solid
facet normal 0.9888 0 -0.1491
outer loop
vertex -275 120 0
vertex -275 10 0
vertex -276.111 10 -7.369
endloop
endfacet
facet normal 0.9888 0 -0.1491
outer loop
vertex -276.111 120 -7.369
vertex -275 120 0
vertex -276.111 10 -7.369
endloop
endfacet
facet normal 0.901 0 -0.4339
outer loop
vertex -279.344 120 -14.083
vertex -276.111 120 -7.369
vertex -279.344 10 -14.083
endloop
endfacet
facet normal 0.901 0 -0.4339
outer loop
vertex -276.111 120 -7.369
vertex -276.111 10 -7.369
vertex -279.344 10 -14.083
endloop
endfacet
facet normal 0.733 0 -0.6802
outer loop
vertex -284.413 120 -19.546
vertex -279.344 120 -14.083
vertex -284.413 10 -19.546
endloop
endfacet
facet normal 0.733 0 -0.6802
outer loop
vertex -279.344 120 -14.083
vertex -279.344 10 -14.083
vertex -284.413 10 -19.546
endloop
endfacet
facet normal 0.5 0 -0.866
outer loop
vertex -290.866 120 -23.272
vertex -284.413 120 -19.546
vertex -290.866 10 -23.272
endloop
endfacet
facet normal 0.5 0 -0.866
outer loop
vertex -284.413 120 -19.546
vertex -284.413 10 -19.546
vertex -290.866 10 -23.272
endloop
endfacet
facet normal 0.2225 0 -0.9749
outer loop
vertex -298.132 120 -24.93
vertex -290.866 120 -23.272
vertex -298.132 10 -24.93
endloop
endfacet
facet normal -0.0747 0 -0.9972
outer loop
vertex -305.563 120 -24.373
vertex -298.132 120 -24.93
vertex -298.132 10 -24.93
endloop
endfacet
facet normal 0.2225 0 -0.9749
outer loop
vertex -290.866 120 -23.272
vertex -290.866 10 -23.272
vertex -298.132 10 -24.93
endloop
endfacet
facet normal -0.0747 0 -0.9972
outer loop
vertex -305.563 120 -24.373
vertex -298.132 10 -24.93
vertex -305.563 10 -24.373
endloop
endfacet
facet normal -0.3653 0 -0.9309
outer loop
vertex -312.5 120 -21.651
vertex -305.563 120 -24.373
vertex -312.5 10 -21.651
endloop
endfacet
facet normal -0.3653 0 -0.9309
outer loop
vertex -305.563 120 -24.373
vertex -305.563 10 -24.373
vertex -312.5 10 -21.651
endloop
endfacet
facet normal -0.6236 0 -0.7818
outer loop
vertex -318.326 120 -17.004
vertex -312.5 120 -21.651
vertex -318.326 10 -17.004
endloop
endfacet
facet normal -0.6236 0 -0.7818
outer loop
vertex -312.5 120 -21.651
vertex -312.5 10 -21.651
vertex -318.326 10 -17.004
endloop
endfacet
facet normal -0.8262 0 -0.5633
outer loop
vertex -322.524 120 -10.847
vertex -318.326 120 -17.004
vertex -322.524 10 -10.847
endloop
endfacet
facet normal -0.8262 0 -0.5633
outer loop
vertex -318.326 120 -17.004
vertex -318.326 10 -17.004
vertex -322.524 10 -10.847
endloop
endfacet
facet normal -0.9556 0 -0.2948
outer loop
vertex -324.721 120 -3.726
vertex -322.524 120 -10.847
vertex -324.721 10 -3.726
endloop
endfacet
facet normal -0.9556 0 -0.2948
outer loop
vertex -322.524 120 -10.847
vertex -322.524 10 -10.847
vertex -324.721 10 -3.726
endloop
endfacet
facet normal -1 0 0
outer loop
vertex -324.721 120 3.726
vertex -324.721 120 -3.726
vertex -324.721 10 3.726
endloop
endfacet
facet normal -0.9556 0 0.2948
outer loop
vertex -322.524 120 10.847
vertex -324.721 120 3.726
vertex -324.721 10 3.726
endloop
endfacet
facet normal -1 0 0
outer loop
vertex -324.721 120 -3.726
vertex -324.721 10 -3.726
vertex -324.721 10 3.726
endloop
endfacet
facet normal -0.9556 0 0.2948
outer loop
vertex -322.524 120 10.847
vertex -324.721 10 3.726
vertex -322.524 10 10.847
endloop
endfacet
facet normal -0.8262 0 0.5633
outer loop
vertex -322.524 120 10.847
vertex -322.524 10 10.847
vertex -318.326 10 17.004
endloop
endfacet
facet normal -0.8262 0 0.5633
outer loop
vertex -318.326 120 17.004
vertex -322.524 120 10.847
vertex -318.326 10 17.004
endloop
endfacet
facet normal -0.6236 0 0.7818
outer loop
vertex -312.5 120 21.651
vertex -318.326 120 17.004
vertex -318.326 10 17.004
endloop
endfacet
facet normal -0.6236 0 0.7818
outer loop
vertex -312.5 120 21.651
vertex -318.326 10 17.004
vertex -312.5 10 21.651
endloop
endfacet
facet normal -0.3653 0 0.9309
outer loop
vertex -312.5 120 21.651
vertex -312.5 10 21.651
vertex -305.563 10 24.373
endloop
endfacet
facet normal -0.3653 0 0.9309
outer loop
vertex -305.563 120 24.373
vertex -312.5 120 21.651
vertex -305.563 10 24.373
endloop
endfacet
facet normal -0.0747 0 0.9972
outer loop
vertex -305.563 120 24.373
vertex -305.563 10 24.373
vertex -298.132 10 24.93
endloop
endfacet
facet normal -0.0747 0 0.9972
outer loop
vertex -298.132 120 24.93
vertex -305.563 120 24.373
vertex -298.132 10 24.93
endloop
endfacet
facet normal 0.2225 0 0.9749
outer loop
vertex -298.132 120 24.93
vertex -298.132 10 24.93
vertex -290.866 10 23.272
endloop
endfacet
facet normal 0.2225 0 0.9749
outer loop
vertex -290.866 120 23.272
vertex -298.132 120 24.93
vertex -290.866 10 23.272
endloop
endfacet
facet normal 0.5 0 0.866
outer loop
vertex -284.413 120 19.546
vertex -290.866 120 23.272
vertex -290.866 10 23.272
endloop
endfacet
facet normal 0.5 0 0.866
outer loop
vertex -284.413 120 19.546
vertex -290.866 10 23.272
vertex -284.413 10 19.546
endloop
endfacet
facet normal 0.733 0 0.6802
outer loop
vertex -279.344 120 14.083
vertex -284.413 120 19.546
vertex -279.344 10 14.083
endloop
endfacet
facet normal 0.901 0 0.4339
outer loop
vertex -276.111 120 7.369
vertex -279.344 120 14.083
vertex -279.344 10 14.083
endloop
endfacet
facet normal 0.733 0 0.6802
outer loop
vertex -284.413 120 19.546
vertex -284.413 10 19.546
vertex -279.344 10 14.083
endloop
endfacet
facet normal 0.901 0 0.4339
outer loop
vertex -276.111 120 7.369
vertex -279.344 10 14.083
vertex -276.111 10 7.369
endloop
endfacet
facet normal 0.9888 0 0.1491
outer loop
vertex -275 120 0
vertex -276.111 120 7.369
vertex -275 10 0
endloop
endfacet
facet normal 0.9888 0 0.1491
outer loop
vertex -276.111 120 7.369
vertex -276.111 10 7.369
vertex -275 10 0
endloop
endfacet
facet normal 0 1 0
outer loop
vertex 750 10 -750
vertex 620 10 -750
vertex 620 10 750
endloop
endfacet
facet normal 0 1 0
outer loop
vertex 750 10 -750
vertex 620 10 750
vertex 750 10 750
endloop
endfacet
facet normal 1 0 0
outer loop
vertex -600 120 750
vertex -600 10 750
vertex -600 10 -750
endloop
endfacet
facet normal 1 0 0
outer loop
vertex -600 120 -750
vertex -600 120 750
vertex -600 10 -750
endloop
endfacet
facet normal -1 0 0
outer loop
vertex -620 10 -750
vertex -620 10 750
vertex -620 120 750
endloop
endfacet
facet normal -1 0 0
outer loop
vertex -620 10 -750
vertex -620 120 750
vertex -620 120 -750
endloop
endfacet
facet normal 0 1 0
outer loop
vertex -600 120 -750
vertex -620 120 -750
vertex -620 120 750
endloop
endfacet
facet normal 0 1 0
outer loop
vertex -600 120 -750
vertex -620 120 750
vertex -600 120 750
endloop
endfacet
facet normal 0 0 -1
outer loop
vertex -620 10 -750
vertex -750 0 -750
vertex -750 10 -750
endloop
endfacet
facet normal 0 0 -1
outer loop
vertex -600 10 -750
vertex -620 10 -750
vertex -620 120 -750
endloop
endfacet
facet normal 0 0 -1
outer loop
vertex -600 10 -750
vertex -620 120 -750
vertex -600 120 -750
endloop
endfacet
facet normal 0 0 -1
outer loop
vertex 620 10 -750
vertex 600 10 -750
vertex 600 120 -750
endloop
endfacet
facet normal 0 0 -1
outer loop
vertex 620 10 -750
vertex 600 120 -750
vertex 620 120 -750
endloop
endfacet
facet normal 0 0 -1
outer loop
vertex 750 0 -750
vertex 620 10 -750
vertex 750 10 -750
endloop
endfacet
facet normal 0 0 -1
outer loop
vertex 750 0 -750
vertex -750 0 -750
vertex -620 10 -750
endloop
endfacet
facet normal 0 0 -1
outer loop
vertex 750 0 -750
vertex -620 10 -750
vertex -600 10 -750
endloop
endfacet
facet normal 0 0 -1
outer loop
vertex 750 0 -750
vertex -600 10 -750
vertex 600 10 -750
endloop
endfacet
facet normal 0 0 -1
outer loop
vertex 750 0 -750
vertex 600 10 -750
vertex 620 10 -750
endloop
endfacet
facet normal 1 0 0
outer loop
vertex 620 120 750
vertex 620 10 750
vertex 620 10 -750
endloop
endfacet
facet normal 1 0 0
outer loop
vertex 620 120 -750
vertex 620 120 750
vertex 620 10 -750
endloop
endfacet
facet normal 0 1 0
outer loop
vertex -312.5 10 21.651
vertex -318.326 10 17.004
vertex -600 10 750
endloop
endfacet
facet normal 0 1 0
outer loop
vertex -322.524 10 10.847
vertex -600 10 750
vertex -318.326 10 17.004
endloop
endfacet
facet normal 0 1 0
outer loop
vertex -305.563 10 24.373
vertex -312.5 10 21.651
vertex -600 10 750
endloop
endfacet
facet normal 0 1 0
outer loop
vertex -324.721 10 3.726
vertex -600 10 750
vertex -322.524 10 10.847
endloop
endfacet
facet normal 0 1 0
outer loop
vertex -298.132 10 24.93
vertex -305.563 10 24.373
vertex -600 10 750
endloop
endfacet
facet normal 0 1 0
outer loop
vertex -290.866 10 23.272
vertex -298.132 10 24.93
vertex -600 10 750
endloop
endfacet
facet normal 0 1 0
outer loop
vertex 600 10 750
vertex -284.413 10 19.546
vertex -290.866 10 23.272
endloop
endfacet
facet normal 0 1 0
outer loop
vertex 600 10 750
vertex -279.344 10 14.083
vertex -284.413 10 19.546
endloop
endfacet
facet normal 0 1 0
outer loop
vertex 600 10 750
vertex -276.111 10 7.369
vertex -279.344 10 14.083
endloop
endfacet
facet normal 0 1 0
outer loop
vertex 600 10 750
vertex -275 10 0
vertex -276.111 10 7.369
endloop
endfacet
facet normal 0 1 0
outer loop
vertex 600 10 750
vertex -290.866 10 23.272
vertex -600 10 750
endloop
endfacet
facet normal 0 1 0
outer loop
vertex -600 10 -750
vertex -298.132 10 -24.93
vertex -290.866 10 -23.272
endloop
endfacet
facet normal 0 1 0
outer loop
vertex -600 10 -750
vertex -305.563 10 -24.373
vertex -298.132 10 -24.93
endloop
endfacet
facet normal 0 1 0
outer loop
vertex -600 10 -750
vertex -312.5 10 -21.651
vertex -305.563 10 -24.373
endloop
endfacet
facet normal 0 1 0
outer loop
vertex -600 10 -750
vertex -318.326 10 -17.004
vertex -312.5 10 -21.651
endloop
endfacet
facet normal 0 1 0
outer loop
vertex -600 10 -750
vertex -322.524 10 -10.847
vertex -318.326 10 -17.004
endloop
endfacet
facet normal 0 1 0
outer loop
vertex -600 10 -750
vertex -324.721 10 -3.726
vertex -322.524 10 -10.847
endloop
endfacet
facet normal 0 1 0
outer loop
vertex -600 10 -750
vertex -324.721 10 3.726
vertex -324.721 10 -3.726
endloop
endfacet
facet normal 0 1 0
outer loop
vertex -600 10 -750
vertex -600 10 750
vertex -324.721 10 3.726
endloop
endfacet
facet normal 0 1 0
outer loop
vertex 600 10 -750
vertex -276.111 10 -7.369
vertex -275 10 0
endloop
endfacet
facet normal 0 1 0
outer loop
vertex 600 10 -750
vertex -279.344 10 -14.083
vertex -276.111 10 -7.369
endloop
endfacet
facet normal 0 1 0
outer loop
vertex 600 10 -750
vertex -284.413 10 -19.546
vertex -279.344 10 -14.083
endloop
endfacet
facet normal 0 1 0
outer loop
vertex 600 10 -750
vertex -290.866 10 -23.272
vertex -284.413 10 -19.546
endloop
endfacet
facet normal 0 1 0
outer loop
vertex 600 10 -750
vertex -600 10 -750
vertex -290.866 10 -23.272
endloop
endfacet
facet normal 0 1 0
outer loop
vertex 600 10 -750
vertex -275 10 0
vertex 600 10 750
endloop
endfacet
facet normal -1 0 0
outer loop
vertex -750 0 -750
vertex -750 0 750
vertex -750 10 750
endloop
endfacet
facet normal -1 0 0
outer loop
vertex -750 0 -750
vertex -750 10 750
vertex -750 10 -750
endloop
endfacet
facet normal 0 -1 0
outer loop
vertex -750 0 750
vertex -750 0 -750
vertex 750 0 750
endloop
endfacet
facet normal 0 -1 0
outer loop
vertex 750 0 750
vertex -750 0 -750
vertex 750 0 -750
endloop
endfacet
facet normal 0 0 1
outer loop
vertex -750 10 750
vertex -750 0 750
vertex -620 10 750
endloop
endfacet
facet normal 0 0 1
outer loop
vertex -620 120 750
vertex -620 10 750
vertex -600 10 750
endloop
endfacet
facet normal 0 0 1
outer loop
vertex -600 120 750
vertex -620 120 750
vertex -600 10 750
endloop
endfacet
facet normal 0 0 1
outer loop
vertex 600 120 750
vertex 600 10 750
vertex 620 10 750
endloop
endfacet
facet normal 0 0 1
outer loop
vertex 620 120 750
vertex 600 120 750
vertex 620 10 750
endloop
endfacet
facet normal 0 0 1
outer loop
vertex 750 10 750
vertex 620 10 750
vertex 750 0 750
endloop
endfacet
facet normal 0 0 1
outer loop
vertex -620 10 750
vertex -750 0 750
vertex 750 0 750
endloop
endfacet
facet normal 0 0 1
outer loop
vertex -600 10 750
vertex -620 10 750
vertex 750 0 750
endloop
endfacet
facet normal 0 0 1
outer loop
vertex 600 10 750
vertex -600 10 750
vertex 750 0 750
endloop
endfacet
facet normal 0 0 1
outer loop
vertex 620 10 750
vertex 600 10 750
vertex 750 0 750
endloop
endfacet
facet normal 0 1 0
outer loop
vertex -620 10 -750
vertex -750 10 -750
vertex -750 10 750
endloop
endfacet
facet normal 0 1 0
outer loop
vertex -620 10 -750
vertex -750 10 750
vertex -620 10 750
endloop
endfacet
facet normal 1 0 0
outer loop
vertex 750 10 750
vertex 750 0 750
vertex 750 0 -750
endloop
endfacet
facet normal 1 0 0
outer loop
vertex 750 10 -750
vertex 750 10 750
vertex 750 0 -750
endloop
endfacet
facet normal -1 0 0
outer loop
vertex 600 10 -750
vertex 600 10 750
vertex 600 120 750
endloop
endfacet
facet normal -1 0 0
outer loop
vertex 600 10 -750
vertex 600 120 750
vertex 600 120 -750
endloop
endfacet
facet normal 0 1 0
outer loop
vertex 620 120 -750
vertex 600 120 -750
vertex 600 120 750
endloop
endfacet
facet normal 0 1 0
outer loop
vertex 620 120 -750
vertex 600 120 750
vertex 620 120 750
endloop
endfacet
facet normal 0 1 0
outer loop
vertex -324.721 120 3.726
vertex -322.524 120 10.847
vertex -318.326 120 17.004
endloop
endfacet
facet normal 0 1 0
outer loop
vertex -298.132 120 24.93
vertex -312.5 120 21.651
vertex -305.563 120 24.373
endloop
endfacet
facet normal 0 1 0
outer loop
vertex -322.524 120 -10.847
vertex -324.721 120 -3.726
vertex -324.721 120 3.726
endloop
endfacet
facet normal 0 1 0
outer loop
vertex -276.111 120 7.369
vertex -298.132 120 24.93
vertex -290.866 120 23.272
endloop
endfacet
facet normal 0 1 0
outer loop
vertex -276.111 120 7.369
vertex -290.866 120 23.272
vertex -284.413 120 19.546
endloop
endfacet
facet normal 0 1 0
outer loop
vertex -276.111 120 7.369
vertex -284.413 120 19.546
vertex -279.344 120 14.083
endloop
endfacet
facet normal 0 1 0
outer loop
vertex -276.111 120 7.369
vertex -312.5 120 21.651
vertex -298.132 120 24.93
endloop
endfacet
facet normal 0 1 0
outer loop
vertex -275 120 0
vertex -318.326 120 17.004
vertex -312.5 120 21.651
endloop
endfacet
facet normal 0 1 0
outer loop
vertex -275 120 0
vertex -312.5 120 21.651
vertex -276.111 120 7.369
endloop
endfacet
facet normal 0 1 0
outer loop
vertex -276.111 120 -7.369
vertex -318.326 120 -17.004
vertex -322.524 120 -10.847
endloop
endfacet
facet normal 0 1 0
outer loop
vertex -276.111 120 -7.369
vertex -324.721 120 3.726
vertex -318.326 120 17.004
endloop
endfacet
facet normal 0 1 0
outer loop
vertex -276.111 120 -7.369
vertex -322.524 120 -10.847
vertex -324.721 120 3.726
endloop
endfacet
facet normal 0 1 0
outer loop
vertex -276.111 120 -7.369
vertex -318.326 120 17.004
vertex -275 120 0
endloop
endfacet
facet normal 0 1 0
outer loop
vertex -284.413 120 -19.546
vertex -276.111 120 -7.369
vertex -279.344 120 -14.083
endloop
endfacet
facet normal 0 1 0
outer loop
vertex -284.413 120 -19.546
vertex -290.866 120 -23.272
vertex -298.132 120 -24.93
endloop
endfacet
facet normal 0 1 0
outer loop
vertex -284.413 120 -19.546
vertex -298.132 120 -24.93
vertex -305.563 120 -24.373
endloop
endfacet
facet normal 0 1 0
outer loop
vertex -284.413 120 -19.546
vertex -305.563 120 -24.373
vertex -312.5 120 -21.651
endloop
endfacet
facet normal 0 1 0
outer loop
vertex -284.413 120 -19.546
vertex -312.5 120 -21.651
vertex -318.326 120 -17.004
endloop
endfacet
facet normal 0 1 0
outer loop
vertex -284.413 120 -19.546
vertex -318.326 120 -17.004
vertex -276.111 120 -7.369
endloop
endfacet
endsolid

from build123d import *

# Parameters (mm, degrees)
SKETCH2_W           = 1500
SKETCH2_H           = 1500
BOSS_EXTRUDE1_DEPTH = 10
SKETCH3_W           = 20
SKETCH3_H           = 1500
BOSS_EXTRUDE2_DEPTH = 110
SKETCH4_R           = 25
BOSS_EXTRUDE3_DEPTH = 110


with BuildPart() as part:
    # Sketch2 → Boss-Extrude1 (new body)
    with BuildSketch(Plane(origin=(0, 0, 0), x_dir=(1, 0, 0), z_dir=(0, 1, 0))):
        Rectangle(SKETCH2_W, SKETCH2_H)
    extrude(amount=BOSS_EXTRUDE1_DEPTH)

    # Sketch3 → Boss-Extrude2 (add)
    with BuildSketch(Plane(origin=(0, 10, 0), x_dir=(1, 0, 0), z_dir=(0, 1, 0))):
        with Locations((-610, 0)):
            Rectangle(SKETCH3_W, SKETCH3_H)
        with Locations((610, 0)):
            Rectangle(SKETCH3_W, SKETCH3_H)
    extrude(amount=BOSS_EXTRUDE2_DEPTH)

    # Sketch4 → Boss-Extrude3 (add)
    with BuildSketch(Plane(origin=(0, 10, 0), x_dir=(1, 0, 0), z_dir=(0, 1, 0))):
        with Locations((-300, 0)):
            Circle(SKETCH4_R)
    extrude(amount=BOSS_EXTRUDE3_DEPTH)


solid = part.part
